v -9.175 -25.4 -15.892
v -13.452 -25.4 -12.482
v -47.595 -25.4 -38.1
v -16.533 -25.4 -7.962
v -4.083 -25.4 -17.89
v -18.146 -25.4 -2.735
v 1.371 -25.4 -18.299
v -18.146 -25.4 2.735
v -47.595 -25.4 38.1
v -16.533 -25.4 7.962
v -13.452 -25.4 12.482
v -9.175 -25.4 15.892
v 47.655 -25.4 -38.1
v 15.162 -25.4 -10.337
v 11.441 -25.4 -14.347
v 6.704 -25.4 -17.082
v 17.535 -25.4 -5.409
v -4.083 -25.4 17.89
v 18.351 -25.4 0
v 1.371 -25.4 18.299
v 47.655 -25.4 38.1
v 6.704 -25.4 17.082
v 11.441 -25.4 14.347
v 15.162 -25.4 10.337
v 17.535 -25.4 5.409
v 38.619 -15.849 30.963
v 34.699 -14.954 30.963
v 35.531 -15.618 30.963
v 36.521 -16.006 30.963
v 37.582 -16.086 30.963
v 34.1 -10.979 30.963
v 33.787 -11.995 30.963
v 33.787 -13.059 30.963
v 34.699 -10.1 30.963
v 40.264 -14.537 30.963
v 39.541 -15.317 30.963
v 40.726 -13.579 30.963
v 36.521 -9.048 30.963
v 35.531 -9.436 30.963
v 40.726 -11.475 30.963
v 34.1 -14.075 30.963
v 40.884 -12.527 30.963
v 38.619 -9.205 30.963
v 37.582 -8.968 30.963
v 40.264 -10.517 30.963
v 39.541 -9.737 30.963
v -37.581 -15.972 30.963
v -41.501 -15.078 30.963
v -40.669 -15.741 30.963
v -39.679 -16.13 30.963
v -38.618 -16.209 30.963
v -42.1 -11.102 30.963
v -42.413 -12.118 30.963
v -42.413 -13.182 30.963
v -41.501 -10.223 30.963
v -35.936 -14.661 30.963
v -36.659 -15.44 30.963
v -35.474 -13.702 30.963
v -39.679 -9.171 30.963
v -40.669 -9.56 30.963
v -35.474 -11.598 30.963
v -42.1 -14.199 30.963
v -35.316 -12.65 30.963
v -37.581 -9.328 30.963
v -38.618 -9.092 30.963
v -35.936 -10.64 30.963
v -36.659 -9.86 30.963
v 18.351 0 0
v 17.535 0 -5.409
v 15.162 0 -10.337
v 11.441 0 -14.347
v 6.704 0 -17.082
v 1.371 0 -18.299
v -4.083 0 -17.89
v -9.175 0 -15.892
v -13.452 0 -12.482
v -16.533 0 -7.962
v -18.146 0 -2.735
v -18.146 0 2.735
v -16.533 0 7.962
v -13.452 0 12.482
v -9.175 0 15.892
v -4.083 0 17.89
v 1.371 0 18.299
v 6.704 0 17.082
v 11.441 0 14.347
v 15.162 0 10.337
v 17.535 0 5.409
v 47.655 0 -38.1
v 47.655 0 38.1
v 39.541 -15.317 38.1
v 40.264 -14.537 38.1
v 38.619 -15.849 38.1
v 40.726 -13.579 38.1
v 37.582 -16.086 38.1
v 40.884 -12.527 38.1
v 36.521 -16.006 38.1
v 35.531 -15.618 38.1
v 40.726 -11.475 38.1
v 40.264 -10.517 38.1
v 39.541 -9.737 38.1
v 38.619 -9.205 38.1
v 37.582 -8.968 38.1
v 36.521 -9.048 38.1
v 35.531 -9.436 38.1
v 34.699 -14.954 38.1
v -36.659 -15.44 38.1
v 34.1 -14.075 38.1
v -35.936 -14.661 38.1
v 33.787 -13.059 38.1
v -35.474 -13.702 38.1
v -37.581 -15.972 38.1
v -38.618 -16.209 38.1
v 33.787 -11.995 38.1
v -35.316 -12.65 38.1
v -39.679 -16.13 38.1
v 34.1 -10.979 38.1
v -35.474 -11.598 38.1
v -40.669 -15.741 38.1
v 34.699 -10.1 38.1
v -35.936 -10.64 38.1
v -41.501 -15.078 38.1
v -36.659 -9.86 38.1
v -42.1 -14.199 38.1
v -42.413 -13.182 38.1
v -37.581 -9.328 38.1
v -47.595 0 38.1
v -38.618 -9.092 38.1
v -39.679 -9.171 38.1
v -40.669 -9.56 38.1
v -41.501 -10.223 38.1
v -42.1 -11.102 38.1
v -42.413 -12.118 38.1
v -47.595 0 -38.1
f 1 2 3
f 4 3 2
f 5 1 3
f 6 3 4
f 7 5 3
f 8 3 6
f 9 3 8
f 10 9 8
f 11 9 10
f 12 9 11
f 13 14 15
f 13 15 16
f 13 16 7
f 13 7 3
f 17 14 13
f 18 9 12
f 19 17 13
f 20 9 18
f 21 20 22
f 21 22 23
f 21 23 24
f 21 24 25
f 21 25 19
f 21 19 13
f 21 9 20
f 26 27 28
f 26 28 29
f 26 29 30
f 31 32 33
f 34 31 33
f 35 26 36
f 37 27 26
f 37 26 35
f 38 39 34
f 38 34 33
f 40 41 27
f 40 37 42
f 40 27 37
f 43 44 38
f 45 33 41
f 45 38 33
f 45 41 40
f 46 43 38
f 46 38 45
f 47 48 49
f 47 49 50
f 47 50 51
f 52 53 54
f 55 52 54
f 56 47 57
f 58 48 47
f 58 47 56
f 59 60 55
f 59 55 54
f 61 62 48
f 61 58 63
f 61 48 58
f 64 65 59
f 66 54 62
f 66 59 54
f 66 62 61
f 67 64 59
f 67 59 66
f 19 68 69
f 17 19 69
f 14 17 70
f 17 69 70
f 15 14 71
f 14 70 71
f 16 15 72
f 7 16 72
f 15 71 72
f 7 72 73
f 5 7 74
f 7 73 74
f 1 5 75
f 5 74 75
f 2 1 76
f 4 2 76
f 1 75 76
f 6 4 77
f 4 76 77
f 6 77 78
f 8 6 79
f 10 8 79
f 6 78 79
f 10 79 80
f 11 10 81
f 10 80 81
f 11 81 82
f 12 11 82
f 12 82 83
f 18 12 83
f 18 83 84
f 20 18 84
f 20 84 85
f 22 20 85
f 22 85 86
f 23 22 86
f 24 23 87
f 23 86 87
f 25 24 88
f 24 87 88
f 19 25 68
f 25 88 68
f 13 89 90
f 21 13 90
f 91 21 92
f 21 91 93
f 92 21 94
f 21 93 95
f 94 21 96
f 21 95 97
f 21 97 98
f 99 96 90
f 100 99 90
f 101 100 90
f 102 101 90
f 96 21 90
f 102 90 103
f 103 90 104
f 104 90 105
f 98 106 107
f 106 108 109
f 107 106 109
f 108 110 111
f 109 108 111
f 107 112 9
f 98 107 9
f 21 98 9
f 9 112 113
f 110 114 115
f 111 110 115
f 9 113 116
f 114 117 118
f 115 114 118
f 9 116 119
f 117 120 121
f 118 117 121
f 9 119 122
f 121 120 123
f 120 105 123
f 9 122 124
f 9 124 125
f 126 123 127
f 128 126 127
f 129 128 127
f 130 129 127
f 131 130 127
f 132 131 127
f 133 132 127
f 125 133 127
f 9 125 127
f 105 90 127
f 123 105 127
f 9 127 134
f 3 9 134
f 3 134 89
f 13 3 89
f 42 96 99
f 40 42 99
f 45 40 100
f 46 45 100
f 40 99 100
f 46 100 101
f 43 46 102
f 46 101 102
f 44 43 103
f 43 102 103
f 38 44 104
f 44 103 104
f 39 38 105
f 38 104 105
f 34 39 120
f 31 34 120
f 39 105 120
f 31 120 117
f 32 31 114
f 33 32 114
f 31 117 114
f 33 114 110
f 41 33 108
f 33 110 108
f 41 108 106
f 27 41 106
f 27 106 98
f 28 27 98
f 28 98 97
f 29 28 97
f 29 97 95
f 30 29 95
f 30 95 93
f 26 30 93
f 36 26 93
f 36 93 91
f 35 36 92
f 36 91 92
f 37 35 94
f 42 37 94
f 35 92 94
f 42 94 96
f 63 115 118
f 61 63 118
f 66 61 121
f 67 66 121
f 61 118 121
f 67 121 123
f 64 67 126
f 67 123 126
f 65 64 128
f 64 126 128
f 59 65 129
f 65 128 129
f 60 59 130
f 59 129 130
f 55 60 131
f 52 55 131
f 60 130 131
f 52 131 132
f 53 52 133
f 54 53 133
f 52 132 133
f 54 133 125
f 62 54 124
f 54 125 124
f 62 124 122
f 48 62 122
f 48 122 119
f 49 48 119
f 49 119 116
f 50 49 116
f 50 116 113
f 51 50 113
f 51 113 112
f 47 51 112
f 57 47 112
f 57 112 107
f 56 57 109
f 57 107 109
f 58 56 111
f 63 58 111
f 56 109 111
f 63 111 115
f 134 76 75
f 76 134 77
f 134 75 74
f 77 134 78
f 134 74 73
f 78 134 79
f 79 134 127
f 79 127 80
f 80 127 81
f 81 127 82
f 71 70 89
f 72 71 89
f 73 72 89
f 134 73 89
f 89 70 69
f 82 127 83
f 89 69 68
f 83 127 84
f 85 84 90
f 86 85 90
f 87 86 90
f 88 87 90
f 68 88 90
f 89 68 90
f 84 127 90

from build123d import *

# Parameters (mm, degrees)
F1_DEPTH = 25.4
F2_R     = 3.5687
F3_DEPTH = 7.1374
F4_DEPTH = 7.1374


# Not quite as in the source:
# - a feature names something its author has since deleted; it is built from what else it names


with BuildPart() as f1:
    # F0 (on Front) → F1 (new body)
    with BuildSketch(Plane.XZ):
        with BuildLine():
            Line((47.6553842176, 38.1), (-47.5946157824, 38.1))
            Line((-47.5946157824, 38.1), (-47.5946157824, 0))
            Line((-47.5946157824, 0), (-18.3505333031, 0))
            ThreePointArc((-18.3505333031, 0), (0, 18.3505333031), (18.3505333031, 0))
            Line((18.3505333031, 0), (47.6553842176, 0))
            Line((47.6553842176, 0), (47.6553842176, 38.1))
        make_face()
        with BuildLine():
            Line((-18.3505333031, 0), (-47.5946157824, 0))
            Line((-47.5946157824, 0), (-47.5946157824, -38.1))
            Line((-47.5946157824, -38.1), (47.6553842176, -38.1))
            Line((47.6553842176, -38.1), (47.6553842176, 0))
            Line((47.6553842176, 0), (18.3505333031, 0))
            ThreePointArc((18.3505333031, 0), (0, -18.3505333031), (-18.3505333031, 0))
        make_face()
    extrude(amount=F1_DEPTH)

    # F2 (on face) → F3 (cut)
    with BuildSketch(Plane.XY.offset(38.1)):
        with Locations((37.3155283745, -12.5269582962)):
            Circle(F2_R)
    extrude(amount=-F3_DEPTH, mode=Mode.SUBTRACT)

    # F2 (on face) → F4 (cut)
    with BuildSketch(Plane.XY.offset(38.1)):
        with Locations((-38.8844716255, -12.6503112141)):
            Circle(F2_R)
        with Locations((37.3155283745, -12.5269582962)):
            Circle(F2_R)
    extrude(amount=-F4_DEPTH, mode=Mode.SUBTRACT)


solid = f1.part
